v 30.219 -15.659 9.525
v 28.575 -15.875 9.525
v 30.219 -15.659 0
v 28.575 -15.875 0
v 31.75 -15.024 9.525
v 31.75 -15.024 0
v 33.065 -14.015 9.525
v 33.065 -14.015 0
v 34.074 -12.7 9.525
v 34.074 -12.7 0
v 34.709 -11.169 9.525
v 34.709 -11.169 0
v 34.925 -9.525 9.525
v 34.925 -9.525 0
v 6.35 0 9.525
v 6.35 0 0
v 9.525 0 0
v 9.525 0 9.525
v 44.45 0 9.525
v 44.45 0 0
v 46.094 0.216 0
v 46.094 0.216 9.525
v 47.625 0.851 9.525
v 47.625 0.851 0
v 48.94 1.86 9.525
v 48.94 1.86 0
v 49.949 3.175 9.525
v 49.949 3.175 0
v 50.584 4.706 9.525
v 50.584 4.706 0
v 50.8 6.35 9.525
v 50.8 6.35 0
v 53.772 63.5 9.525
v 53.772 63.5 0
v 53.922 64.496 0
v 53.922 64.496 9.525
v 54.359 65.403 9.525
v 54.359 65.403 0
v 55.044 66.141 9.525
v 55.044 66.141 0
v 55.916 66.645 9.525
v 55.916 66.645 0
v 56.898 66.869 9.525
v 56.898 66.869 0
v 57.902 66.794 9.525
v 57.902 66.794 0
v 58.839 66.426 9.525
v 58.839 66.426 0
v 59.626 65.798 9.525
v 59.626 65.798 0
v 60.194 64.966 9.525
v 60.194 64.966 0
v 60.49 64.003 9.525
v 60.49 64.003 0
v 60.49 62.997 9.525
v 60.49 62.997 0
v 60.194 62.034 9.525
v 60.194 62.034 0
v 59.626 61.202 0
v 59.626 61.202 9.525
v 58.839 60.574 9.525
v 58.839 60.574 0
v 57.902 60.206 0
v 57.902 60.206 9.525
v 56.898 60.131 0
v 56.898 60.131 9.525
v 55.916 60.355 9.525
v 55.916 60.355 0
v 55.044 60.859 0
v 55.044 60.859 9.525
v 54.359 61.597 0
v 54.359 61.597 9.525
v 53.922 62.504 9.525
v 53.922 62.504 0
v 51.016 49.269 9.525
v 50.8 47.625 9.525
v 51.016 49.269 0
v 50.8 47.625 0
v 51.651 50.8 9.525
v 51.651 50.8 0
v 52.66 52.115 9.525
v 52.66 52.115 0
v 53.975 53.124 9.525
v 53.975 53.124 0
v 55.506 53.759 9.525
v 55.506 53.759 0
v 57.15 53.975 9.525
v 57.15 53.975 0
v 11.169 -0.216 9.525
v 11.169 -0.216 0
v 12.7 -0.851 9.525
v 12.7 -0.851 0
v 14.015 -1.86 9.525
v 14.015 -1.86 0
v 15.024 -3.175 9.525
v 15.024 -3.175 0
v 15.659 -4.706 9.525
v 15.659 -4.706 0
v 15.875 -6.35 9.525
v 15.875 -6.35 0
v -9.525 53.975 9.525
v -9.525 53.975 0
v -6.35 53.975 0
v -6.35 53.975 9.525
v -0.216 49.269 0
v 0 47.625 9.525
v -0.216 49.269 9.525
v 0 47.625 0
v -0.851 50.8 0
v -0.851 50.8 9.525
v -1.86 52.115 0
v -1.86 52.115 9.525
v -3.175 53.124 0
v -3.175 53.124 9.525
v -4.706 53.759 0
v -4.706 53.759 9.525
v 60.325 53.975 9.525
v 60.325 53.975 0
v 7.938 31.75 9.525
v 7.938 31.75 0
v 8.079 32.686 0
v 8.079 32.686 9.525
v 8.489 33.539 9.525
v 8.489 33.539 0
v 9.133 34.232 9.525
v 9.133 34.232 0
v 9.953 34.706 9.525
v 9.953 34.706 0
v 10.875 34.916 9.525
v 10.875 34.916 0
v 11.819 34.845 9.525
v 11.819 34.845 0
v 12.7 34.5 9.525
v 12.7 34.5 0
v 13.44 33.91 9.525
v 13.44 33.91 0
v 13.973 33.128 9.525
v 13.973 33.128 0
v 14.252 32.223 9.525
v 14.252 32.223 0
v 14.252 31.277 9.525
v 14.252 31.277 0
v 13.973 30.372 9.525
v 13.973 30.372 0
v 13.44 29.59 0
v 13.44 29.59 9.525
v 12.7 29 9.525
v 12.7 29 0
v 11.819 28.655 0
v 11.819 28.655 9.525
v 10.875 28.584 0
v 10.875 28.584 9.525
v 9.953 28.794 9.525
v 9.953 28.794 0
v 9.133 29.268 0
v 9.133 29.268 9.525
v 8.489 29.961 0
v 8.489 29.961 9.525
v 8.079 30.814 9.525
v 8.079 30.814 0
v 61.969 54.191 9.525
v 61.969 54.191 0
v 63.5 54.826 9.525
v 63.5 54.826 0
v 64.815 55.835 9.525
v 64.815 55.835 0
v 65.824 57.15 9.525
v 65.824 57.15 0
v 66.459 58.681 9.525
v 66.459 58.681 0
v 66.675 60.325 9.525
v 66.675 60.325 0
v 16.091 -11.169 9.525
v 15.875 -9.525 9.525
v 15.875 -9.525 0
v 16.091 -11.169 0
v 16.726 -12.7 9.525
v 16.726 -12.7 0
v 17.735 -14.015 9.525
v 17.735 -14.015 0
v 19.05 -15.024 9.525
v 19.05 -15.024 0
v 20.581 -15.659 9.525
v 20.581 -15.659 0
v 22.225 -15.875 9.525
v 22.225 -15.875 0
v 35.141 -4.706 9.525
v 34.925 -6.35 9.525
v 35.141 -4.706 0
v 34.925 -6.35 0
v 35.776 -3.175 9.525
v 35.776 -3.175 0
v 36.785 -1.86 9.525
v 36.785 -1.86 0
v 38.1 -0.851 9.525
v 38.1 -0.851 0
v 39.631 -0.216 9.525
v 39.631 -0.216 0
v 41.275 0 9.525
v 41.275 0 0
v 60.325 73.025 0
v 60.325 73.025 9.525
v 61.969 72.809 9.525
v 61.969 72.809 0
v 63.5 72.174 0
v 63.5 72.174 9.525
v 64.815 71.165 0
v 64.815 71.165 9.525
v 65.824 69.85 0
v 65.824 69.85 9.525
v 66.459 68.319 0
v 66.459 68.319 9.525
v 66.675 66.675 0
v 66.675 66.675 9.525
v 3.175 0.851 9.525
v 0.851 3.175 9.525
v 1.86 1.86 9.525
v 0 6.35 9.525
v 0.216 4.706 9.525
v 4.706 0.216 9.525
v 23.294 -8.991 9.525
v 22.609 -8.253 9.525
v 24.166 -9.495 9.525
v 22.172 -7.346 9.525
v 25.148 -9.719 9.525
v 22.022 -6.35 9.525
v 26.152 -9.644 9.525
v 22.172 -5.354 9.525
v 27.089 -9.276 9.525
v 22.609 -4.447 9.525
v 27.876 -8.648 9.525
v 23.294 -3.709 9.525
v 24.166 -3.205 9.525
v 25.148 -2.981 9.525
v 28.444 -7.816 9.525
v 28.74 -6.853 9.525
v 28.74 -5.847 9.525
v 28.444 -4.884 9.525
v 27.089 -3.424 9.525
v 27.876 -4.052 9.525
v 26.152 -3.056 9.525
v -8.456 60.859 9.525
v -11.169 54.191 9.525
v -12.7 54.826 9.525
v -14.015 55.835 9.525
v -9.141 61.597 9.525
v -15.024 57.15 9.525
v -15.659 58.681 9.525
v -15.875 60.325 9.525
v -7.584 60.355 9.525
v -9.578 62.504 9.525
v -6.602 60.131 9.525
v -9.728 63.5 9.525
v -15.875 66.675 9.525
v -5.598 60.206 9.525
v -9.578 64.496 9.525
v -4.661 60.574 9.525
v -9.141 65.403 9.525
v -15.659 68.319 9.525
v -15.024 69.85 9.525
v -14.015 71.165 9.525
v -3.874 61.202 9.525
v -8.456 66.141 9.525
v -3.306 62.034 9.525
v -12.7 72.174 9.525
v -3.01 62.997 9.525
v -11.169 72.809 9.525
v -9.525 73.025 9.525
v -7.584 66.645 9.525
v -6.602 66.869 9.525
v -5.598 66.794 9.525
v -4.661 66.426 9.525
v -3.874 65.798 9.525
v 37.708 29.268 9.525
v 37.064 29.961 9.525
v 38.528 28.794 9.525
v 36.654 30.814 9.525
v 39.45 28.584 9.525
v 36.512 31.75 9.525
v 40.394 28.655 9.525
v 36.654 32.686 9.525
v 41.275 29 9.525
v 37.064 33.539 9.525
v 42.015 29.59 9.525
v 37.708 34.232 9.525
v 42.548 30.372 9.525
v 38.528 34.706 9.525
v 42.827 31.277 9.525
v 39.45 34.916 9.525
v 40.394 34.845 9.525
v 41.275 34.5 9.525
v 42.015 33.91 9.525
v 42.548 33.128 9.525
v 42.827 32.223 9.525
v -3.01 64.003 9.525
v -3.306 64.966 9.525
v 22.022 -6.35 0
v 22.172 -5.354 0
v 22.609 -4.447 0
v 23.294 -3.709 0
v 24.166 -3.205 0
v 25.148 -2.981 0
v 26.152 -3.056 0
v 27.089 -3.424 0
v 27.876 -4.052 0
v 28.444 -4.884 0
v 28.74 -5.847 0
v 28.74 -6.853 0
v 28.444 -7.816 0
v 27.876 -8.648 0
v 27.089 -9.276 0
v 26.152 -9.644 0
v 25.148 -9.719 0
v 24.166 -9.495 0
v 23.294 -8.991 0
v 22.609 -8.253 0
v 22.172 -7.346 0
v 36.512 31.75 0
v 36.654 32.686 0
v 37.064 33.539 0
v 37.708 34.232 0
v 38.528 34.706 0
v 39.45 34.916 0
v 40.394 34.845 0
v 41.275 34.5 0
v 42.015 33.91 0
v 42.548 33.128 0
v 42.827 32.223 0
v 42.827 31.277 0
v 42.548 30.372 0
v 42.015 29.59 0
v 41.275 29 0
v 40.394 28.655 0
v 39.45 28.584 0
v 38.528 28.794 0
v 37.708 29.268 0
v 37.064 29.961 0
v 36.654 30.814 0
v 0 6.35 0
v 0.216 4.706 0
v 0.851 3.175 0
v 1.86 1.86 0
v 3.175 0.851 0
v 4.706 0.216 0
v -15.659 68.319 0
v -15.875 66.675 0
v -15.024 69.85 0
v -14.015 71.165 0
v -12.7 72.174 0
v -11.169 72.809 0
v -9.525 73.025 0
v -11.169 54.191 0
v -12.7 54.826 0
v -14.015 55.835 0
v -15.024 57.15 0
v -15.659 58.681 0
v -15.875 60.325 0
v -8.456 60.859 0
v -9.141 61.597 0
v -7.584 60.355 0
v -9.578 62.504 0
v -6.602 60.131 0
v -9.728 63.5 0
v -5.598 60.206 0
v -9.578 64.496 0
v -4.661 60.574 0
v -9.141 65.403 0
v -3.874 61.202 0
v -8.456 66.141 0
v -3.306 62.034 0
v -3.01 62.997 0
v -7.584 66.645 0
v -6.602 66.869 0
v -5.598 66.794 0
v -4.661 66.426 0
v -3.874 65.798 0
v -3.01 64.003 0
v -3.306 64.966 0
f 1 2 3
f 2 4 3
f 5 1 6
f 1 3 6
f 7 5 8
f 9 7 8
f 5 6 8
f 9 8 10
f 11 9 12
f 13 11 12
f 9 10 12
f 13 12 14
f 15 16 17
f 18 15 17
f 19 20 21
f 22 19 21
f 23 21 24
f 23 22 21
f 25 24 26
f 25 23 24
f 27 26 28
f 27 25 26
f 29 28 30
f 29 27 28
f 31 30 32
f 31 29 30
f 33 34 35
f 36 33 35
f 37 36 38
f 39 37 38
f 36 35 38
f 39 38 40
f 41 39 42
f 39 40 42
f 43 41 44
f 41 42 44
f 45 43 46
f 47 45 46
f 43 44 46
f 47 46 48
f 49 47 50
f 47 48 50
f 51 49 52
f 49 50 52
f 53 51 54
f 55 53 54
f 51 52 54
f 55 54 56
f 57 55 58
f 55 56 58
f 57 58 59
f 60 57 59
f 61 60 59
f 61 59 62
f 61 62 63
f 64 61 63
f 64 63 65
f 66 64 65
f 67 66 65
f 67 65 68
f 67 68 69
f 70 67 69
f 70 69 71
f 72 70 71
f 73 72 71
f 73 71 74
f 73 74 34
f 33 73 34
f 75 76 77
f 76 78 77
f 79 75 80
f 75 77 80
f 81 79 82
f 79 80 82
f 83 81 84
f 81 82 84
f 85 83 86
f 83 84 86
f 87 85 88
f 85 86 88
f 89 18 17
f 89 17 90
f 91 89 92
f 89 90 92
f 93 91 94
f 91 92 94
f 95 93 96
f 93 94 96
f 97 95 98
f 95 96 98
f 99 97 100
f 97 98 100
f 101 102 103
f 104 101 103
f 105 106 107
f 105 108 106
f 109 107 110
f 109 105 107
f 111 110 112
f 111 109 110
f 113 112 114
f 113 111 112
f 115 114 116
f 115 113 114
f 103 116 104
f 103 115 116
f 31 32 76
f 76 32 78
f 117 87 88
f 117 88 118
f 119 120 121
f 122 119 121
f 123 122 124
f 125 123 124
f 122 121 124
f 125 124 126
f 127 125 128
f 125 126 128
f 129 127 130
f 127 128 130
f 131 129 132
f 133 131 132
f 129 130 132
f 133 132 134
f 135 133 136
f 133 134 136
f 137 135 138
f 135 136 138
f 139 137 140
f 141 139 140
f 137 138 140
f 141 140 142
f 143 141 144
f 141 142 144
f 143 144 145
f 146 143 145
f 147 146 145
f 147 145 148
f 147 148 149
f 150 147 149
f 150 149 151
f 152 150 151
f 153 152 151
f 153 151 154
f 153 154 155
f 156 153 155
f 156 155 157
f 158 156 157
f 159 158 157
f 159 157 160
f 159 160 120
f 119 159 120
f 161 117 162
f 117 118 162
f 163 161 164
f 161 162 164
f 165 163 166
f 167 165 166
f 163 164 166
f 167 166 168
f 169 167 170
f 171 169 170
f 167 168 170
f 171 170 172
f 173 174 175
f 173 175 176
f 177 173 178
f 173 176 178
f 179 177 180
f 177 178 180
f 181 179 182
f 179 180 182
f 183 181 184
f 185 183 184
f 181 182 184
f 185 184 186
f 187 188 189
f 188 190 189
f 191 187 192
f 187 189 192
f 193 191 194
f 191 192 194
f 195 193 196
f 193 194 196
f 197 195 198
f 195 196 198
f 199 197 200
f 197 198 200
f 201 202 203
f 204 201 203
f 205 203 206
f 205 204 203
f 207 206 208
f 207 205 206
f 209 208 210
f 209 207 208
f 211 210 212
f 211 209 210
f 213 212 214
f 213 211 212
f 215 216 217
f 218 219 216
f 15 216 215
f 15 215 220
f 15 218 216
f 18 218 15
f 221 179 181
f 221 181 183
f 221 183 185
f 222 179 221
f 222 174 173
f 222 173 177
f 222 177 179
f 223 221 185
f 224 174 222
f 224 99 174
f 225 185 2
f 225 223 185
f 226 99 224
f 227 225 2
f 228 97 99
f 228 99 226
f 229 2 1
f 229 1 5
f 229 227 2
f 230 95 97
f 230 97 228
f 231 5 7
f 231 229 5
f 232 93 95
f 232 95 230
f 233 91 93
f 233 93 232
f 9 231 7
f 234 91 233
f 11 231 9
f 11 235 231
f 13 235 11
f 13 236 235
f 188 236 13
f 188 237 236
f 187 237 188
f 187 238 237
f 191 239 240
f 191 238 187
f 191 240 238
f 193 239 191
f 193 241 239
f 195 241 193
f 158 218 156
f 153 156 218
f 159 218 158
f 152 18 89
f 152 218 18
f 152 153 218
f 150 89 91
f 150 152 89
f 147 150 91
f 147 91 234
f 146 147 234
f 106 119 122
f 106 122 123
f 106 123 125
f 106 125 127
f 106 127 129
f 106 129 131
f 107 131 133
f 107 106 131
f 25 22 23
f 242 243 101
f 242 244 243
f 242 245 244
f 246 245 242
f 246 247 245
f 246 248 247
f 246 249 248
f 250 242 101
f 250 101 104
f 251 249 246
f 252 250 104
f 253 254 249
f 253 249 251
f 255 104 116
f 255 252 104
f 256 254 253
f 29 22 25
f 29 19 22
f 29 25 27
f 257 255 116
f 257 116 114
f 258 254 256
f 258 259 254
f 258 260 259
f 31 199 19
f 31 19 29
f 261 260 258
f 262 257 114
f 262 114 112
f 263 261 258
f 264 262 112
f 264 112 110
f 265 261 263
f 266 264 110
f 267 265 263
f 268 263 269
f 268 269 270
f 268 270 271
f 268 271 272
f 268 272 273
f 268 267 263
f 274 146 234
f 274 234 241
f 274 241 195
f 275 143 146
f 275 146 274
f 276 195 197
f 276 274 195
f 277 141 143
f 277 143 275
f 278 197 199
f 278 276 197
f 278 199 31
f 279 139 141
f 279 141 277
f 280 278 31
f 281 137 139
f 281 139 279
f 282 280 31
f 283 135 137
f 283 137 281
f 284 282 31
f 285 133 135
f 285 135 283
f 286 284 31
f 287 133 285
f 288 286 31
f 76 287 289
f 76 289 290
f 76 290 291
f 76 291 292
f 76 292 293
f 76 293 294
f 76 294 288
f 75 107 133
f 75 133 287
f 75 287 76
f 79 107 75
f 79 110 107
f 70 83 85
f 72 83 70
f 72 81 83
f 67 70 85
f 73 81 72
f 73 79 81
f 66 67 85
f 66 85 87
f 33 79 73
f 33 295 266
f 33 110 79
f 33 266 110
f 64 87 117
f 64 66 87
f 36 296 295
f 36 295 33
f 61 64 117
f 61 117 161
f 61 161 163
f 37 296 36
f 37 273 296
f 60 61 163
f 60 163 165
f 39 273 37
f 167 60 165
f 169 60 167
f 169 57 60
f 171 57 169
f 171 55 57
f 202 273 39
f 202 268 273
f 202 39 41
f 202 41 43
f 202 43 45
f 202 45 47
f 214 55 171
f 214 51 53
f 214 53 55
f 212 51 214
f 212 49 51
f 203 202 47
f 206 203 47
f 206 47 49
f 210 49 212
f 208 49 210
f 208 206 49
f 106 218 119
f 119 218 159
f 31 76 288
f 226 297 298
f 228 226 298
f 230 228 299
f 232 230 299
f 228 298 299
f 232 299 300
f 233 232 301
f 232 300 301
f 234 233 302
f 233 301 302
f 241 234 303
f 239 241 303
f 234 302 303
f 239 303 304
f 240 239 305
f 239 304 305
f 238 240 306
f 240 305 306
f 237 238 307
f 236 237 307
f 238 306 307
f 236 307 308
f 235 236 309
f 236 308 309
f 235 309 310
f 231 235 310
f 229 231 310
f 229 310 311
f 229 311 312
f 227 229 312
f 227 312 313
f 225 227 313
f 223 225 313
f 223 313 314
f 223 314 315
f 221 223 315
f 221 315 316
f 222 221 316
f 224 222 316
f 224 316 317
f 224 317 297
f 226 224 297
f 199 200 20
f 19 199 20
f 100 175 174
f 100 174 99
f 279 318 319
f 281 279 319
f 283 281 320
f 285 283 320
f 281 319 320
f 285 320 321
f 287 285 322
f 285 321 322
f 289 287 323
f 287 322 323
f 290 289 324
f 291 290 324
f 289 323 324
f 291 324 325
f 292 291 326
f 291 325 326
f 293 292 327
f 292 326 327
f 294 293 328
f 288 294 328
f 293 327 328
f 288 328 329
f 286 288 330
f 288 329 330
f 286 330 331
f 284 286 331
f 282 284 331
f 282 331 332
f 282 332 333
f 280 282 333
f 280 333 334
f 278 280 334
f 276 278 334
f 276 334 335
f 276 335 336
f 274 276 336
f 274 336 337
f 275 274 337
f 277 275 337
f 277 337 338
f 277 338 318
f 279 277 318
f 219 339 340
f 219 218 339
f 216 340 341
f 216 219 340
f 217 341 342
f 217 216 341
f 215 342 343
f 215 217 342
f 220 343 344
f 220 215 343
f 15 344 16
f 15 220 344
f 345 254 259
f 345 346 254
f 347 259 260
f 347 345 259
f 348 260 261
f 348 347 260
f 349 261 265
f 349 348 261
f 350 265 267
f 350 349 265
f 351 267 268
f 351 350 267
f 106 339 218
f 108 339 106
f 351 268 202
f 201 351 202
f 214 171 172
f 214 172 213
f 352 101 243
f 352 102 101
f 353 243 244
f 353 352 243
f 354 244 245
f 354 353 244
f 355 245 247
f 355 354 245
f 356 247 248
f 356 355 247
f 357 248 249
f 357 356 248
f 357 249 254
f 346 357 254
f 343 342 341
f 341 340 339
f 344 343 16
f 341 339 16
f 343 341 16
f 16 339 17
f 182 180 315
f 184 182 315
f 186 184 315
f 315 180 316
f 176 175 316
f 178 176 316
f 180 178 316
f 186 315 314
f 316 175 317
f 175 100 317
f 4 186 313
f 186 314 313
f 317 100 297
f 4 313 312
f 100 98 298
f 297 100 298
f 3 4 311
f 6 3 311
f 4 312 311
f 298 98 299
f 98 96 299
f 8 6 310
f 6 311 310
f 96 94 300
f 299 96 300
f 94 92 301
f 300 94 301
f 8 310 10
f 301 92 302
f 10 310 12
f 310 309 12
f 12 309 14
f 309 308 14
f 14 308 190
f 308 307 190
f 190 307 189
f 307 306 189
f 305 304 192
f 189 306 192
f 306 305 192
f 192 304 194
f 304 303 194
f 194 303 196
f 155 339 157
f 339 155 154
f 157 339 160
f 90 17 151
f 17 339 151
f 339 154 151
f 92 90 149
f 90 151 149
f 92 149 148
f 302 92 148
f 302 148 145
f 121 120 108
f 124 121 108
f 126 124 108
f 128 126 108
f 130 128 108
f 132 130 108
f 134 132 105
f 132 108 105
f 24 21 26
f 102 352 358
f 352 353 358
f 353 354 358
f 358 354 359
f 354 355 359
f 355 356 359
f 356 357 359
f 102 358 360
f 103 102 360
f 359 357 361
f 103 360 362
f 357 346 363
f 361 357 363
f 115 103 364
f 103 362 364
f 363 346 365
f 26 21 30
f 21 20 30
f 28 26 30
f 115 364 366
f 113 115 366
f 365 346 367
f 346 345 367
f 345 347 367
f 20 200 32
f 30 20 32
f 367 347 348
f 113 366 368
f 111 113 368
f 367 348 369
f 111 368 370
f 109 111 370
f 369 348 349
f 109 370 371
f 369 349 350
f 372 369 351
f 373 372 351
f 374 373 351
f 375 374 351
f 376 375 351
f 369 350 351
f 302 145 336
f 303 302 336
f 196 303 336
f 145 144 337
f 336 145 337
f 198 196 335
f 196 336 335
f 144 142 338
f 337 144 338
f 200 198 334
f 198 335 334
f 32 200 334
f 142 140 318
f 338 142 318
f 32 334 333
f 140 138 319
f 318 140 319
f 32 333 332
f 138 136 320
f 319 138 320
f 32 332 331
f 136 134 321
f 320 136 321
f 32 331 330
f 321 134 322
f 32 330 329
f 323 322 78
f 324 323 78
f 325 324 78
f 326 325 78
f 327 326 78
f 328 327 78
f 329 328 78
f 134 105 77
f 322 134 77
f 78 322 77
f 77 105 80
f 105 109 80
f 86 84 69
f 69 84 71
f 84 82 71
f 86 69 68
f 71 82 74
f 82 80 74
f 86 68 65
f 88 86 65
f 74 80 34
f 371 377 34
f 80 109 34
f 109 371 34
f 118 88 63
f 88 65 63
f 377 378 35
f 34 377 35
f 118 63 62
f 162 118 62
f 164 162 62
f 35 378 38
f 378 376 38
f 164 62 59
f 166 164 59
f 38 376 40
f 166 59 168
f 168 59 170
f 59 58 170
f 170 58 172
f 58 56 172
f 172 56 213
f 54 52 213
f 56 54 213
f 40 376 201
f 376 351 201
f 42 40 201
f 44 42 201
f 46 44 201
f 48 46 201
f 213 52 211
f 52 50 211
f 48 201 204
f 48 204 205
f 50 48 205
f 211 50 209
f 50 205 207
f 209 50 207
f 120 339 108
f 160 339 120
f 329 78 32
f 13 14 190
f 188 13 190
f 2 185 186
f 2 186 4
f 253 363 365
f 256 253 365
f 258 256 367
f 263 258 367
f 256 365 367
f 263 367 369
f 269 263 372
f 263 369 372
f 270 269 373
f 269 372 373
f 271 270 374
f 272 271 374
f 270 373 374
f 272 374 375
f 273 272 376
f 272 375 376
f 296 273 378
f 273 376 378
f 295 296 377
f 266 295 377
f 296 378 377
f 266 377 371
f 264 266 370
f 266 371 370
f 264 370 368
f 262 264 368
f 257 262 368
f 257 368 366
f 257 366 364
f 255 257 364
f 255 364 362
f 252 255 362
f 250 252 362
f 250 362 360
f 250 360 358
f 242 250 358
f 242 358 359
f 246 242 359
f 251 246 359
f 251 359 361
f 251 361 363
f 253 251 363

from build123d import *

# Parameters (mm, degrees)
SKETCH1_W                   = 50.8
SKETCH1_H                   = 101.6
BOSS_EXTRUDE1_DEPTH         = 9.525
F_3_0_3_DIAMETER_HOLE1_D    = 3
SKETCH4_W                   = 15.875
SKETCH4_H                   = 19.05
SKETCH4_W_2                 = 19.05
SKETCH4_H_2                 = 15.875
BOSS_EXTRUDE2_DEPTH         = 9.525
F_1_4_CLEARANCE_HOLE1_D     = 6.7564
FILLET1_R                   = 6.35
SKETCH7_W                   = 63.5
SKETCH7_H                   = 28.575
CUT_EXTRUDE1_DEPTH          = 122.89684676
F_1_4_0_25_DIAMETER_HOLE1_D = 6.35


with BuildPart() as part:
    # Sketch1 → Boss-Extrude1 (new body)
    with BuildSketch(Plane.XY):
        with Locations((25.4, 50.8)):
            Rectangle(SKETCH1_W, SKETCH1_H)
    extrude(amount=BOSS_EXTRUDE1_DEPTH)

    # Ø3.0 (3) Diameter Hole1 (through all)
    with Locations(Plane.XY.offset(9.525)):
        with Locations((12.899999981, 87.60000006), (37.900000019, 87.60000006)):
            Hole(F_3_0_3_DIAMETER_HOLE1_D / 2)

    # Sketch4 → Boss-Extrude2 (add)
    with BuildSketch(Plane.XY.offset(9.525)):
        with Locations((-7.9375, 63.5)):
            Rectangle(SKETCH4_W, SKETCH4_H)
        with Locations((58.7375, 63.5)):
            Rectangle(SKETCH4_W, SKETCH4_H)
        with Locations((25.4, -7.9375)):
            Rectangle(SKETCH4_W_2, SKETCH4_H_2)
    extrude(amount=-BOSS_EXTRUDE2_DEPTH)

    # 1/4 Clearance Hole1 (through all)
    with Locations(Plane.XY.offset(9.525)):
        with Locations((-6.35, 63.5), (57.15, 63.5), (25.4, -6.35)):
            Hole(F_1_4_CLEARANCE_HOLE1_D / 2)

    # Fillet1
    fillet1_edges = [part.edges().sort_by_distance(p)[0] for p in [
        (-15.875, 73.025, 4.7625),
        (-15.875, 53.975, 4.7625),
        (0, 53.975, 4.7625),
        (0, 73.025, 4.7625),
        (50.8, 53.975, 4.7625),
        (66.675, 53.975, 4.7625),
        (66.675, 73.025, 4.7625),
        (50.8, 73.025, 4.7625),
        (34.925, -15.875, 4.7625),
        (34.925, 0, 4.7625),
        (15.875, 0, 4.7625),
        (15.875, -15.875, 4.7625),
        (0, 101.6, 4.7625),
        (50.8, 101.6, 4.7625),
        (50.8, 0, 4.7625),
        (0, 0, 4.7625),
    ]]
    fillet(fillet1_edges, radius=FILLET1_R)

    # Sketch7 → Cut-Extrude1 (cut, through all)
    with BuildSketch(Plane.XY.offset(9.525)):
        with Locations((25.4, 87.3125)):
            Rectangle(SKETCH7_W, SKETCH7_H)
    extrude(amount=-CUT_EXTRUDE1_DEPTH, mode=Mode.SUBTRACT)

    # 1/4 (0.25) Diameter Hole1 (through all)
    with Locations(Plane.XY.offset(9.525)):
        with Locations((11.1125, 31.75), (39.6875, 31.75)):
            Hole(F_1_4_0_25_DIAMETER_HOLE1_D / 2)


solid = part.part
